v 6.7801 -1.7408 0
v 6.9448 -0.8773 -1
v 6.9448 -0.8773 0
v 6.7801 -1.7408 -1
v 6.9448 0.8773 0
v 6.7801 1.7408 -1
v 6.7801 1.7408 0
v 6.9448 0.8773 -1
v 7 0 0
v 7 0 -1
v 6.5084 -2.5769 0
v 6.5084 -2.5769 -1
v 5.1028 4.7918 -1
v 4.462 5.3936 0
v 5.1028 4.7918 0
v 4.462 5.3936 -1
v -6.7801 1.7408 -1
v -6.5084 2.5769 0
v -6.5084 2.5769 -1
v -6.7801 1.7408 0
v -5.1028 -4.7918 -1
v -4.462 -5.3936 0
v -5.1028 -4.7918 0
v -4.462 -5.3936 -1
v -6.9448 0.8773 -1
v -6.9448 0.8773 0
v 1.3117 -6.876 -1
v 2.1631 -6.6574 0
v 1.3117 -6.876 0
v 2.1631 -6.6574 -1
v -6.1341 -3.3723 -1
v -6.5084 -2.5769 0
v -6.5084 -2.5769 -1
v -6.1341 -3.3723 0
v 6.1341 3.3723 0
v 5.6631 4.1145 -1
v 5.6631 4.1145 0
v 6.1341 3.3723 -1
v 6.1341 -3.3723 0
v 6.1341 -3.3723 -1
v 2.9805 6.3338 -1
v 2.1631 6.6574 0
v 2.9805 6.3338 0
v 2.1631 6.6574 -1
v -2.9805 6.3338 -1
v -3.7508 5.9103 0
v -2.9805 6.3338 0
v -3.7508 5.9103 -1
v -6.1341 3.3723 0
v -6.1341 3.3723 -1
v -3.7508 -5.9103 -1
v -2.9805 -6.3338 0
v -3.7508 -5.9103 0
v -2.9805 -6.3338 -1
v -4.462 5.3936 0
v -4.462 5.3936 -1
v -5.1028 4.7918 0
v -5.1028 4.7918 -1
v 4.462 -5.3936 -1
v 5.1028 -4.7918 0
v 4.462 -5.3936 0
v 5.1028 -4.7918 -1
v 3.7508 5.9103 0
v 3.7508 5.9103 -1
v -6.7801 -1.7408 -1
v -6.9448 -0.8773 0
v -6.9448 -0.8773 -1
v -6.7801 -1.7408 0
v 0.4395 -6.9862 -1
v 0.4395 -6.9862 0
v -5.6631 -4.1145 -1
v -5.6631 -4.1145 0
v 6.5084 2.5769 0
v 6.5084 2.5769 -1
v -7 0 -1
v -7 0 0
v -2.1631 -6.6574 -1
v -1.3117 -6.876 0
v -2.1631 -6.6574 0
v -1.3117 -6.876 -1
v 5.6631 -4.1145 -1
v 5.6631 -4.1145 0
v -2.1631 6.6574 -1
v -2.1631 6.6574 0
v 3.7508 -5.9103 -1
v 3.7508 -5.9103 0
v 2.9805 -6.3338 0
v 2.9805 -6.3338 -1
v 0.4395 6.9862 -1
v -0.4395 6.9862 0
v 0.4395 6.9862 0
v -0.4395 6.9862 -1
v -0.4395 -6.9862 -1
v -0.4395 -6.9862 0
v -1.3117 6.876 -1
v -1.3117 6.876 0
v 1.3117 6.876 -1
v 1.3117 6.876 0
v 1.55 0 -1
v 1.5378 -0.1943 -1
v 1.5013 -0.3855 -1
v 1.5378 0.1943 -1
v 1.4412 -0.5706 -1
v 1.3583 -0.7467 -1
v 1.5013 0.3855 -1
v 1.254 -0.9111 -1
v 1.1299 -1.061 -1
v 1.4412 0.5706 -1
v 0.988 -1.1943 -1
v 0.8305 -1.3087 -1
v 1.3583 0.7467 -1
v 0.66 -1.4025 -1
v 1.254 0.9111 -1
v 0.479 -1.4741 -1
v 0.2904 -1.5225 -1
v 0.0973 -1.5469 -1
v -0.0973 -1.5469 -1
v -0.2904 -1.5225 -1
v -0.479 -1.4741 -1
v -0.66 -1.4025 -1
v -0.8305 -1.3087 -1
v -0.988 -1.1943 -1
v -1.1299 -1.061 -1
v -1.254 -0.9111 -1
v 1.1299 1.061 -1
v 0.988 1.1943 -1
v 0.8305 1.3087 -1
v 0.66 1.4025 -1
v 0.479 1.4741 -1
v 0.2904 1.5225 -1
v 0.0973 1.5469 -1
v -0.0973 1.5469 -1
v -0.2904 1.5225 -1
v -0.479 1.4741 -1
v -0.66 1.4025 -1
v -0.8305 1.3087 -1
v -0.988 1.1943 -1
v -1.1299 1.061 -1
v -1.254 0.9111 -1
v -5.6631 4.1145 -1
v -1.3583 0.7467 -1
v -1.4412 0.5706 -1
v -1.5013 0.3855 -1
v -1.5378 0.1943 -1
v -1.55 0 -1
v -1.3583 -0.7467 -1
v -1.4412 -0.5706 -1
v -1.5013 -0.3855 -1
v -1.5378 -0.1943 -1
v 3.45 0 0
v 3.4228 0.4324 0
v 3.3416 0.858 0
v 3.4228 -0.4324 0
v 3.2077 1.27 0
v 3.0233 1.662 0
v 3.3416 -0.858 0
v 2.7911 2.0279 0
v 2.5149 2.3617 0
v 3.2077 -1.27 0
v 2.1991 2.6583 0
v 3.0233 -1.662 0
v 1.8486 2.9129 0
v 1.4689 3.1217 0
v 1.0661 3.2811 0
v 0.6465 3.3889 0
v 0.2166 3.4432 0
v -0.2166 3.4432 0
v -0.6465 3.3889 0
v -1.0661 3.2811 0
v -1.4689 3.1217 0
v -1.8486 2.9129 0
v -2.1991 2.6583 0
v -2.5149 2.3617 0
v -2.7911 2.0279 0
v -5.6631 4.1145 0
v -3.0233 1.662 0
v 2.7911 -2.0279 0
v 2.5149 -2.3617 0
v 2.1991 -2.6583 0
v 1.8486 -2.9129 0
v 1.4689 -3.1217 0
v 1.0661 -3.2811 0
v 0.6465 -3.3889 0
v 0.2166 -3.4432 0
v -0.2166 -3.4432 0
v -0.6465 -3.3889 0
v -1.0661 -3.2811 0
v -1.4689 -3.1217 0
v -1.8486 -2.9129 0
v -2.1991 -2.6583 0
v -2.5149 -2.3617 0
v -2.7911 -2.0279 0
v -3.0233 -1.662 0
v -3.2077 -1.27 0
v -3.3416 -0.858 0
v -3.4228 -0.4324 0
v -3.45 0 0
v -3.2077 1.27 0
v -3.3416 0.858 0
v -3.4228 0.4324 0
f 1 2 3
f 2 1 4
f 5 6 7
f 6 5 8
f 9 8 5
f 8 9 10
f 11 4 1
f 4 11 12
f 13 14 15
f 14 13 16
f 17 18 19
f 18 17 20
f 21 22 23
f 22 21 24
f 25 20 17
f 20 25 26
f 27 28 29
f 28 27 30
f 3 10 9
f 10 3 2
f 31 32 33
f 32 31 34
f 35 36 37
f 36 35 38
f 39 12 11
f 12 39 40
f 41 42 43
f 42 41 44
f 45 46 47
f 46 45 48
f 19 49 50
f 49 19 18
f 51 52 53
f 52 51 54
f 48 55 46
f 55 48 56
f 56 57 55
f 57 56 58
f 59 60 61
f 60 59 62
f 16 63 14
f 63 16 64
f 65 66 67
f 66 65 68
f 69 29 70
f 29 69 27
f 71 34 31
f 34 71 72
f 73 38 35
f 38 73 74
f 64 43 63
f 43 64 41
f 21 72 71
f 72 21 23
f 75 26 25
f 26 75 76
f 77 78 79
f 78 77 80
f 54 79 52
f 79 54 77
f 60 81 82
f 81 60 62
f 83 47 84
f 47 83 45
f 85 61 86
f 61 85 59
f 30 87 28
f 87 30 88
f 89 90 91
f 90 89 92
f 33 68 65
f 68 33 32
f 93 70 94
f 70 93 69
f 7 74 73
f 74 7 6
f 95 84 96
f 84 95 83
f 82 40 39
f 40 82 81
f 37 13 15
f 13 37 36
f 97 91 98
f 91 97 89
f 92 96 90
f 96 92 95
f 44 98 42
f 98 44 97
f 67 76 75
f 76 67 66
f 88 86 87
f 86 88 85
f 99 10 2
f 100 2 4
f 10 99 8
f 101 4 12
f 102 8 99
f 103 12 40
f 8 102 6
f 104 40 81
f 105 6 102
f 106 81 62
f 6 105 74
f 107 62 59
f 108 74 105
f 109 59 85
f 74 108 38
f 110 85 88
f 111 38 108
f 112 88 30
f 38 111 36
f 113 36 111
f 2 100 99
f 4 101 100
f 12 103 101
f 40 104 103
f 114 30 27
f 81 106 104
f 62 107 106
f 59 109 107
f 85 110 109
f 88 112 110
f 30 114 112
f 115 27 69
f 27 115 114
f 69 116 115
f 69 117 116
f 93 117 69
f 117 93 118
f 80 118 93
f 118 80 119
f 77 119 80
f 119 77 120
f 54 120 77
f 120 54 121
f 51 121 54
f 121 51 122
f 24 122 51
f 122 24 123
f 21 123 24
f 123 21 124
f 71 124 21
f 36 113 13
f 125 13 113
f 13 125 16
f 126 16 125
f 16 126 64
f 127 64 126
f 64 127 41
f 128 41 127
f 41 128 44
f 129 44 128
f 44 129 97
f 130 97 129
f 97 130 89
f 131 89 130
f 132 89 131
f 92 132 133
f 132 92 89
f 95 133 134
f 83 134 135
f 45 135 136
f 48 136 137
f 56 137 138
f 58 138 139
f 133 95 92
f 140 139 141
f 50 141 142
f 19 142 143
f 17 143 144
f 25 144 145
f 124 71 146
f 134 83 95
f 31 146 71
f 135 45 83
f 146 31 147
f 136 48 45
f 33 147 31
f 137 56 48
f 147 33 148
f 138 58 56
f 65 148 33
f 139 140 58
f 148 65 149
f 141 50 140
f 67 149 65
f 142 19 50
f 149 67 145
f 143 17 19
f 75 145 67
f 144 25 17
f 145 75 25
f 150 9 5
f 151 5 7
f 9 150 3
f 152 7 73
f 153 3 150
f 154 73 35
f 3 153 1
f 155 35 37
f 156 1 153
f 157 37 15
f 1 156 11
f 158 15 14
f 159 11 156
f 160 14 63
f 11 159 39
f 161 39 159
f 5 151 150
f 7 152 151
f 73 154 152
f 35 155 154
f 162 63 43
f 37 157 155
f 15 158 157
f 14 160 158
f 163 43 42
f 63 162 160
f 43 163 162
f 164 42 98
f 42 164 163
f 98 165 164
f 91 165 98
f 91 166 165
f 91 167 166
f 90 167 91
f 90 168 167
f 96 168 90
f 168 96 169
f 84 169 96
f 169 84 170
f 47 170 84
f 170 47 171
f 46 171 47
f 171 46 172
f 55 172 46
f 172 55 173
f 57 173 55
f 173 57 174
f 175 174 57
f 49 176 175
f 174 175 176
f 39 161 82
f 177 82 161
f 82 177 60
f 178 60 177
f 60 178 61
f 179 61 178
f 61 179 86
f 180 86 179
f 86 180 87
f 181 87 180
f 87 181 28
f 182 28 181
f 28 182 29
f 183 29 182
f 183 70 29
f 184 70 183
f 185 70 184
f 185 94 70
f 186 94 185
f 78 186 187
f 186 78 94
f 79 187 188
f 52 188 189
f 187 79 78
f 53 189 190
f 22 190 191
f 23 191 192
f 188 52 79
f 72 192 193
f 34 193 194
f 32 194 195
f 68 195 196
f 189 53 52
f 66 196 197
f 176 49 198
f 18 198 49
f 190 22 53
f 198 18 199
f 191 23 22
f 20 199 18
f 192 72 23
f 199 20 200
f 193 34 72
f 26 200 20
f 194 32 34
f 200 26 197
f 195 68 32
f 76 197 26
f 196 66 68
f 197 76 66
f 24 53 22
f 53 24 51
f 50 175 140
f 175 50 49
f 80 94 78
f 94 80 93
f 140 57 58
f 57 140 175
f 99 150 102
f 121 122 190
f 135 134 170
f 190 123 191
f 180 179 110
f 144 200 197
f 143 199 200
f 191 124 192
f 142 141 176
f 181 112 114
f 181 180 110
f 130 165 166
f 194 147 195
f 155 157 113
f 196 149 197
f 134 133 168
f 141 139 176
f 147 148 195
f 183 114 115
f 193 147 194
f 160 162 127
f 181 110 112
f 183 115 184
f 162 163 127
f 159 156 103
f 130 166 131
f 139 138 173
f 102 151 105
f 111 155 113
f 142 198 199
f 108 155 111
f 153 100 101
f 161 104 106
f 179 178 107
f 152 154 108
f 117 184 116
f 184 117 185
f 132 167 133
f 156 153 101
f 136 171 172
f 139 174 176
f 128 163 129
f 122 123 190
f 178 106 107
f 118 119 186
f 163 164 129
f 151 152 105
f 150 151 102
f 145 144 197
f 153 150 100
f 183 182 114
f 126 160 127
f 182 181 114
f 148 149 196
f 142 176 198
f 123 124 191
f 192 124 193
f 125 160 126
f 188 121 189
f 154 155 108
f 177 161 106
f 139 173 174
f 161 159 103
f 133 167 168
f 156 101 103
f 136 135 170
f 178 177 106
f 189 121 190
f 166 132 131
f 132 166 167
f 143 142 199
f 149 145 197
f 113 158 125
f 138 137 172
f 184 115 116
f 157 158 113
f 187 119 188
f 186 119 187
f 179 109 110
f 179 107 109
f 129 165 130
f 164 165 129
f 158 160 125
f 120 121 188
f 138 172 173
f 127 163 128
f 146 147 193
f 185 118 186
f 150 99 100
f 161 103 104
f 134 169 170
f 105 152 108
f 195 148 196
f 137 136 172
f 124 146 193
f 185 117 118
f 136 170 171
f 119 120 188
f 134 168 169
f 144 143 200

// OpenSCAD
$fn = 50;


difference() {
	union() {
		translate(v = [0, 0, -1.0000000000]) {
			cylinder(h = 1.0000000000, r = 7.0000000000);
		}
		translate(v = [0, 0, -1.0000000000]) {
			cylinder(h = 1.0000000000, r = 2.8750000000);
		}
	}
	union() {
		translate(v = [0, 0, 0]) {
			rotate(a = [0, 0, 0]) {
				difference() {
					union() {
						translate(v = [0, 0, -1.0000000000]) {
							cylinder(h = 1.0000000000, r = 1.2500000000);
						}
						translate(v = [0, 0, -1.0000000000]) {
							cylinder(h = 1.0000000000, r1 = 1.5500000000, r2 = 3.4500000000);
						}
						translate(v = [0, 0, -1.0000000000]) {
							cylinder(h = 1.0000000000, r = 1.5500000000);
						}
						translate(v = [0, 0, -1.0000000000]) {
							cylinder(h = 1.0000000000, r = 1.2500000000);
						}
					}
					union();
				}
			}
		}
	}
}
